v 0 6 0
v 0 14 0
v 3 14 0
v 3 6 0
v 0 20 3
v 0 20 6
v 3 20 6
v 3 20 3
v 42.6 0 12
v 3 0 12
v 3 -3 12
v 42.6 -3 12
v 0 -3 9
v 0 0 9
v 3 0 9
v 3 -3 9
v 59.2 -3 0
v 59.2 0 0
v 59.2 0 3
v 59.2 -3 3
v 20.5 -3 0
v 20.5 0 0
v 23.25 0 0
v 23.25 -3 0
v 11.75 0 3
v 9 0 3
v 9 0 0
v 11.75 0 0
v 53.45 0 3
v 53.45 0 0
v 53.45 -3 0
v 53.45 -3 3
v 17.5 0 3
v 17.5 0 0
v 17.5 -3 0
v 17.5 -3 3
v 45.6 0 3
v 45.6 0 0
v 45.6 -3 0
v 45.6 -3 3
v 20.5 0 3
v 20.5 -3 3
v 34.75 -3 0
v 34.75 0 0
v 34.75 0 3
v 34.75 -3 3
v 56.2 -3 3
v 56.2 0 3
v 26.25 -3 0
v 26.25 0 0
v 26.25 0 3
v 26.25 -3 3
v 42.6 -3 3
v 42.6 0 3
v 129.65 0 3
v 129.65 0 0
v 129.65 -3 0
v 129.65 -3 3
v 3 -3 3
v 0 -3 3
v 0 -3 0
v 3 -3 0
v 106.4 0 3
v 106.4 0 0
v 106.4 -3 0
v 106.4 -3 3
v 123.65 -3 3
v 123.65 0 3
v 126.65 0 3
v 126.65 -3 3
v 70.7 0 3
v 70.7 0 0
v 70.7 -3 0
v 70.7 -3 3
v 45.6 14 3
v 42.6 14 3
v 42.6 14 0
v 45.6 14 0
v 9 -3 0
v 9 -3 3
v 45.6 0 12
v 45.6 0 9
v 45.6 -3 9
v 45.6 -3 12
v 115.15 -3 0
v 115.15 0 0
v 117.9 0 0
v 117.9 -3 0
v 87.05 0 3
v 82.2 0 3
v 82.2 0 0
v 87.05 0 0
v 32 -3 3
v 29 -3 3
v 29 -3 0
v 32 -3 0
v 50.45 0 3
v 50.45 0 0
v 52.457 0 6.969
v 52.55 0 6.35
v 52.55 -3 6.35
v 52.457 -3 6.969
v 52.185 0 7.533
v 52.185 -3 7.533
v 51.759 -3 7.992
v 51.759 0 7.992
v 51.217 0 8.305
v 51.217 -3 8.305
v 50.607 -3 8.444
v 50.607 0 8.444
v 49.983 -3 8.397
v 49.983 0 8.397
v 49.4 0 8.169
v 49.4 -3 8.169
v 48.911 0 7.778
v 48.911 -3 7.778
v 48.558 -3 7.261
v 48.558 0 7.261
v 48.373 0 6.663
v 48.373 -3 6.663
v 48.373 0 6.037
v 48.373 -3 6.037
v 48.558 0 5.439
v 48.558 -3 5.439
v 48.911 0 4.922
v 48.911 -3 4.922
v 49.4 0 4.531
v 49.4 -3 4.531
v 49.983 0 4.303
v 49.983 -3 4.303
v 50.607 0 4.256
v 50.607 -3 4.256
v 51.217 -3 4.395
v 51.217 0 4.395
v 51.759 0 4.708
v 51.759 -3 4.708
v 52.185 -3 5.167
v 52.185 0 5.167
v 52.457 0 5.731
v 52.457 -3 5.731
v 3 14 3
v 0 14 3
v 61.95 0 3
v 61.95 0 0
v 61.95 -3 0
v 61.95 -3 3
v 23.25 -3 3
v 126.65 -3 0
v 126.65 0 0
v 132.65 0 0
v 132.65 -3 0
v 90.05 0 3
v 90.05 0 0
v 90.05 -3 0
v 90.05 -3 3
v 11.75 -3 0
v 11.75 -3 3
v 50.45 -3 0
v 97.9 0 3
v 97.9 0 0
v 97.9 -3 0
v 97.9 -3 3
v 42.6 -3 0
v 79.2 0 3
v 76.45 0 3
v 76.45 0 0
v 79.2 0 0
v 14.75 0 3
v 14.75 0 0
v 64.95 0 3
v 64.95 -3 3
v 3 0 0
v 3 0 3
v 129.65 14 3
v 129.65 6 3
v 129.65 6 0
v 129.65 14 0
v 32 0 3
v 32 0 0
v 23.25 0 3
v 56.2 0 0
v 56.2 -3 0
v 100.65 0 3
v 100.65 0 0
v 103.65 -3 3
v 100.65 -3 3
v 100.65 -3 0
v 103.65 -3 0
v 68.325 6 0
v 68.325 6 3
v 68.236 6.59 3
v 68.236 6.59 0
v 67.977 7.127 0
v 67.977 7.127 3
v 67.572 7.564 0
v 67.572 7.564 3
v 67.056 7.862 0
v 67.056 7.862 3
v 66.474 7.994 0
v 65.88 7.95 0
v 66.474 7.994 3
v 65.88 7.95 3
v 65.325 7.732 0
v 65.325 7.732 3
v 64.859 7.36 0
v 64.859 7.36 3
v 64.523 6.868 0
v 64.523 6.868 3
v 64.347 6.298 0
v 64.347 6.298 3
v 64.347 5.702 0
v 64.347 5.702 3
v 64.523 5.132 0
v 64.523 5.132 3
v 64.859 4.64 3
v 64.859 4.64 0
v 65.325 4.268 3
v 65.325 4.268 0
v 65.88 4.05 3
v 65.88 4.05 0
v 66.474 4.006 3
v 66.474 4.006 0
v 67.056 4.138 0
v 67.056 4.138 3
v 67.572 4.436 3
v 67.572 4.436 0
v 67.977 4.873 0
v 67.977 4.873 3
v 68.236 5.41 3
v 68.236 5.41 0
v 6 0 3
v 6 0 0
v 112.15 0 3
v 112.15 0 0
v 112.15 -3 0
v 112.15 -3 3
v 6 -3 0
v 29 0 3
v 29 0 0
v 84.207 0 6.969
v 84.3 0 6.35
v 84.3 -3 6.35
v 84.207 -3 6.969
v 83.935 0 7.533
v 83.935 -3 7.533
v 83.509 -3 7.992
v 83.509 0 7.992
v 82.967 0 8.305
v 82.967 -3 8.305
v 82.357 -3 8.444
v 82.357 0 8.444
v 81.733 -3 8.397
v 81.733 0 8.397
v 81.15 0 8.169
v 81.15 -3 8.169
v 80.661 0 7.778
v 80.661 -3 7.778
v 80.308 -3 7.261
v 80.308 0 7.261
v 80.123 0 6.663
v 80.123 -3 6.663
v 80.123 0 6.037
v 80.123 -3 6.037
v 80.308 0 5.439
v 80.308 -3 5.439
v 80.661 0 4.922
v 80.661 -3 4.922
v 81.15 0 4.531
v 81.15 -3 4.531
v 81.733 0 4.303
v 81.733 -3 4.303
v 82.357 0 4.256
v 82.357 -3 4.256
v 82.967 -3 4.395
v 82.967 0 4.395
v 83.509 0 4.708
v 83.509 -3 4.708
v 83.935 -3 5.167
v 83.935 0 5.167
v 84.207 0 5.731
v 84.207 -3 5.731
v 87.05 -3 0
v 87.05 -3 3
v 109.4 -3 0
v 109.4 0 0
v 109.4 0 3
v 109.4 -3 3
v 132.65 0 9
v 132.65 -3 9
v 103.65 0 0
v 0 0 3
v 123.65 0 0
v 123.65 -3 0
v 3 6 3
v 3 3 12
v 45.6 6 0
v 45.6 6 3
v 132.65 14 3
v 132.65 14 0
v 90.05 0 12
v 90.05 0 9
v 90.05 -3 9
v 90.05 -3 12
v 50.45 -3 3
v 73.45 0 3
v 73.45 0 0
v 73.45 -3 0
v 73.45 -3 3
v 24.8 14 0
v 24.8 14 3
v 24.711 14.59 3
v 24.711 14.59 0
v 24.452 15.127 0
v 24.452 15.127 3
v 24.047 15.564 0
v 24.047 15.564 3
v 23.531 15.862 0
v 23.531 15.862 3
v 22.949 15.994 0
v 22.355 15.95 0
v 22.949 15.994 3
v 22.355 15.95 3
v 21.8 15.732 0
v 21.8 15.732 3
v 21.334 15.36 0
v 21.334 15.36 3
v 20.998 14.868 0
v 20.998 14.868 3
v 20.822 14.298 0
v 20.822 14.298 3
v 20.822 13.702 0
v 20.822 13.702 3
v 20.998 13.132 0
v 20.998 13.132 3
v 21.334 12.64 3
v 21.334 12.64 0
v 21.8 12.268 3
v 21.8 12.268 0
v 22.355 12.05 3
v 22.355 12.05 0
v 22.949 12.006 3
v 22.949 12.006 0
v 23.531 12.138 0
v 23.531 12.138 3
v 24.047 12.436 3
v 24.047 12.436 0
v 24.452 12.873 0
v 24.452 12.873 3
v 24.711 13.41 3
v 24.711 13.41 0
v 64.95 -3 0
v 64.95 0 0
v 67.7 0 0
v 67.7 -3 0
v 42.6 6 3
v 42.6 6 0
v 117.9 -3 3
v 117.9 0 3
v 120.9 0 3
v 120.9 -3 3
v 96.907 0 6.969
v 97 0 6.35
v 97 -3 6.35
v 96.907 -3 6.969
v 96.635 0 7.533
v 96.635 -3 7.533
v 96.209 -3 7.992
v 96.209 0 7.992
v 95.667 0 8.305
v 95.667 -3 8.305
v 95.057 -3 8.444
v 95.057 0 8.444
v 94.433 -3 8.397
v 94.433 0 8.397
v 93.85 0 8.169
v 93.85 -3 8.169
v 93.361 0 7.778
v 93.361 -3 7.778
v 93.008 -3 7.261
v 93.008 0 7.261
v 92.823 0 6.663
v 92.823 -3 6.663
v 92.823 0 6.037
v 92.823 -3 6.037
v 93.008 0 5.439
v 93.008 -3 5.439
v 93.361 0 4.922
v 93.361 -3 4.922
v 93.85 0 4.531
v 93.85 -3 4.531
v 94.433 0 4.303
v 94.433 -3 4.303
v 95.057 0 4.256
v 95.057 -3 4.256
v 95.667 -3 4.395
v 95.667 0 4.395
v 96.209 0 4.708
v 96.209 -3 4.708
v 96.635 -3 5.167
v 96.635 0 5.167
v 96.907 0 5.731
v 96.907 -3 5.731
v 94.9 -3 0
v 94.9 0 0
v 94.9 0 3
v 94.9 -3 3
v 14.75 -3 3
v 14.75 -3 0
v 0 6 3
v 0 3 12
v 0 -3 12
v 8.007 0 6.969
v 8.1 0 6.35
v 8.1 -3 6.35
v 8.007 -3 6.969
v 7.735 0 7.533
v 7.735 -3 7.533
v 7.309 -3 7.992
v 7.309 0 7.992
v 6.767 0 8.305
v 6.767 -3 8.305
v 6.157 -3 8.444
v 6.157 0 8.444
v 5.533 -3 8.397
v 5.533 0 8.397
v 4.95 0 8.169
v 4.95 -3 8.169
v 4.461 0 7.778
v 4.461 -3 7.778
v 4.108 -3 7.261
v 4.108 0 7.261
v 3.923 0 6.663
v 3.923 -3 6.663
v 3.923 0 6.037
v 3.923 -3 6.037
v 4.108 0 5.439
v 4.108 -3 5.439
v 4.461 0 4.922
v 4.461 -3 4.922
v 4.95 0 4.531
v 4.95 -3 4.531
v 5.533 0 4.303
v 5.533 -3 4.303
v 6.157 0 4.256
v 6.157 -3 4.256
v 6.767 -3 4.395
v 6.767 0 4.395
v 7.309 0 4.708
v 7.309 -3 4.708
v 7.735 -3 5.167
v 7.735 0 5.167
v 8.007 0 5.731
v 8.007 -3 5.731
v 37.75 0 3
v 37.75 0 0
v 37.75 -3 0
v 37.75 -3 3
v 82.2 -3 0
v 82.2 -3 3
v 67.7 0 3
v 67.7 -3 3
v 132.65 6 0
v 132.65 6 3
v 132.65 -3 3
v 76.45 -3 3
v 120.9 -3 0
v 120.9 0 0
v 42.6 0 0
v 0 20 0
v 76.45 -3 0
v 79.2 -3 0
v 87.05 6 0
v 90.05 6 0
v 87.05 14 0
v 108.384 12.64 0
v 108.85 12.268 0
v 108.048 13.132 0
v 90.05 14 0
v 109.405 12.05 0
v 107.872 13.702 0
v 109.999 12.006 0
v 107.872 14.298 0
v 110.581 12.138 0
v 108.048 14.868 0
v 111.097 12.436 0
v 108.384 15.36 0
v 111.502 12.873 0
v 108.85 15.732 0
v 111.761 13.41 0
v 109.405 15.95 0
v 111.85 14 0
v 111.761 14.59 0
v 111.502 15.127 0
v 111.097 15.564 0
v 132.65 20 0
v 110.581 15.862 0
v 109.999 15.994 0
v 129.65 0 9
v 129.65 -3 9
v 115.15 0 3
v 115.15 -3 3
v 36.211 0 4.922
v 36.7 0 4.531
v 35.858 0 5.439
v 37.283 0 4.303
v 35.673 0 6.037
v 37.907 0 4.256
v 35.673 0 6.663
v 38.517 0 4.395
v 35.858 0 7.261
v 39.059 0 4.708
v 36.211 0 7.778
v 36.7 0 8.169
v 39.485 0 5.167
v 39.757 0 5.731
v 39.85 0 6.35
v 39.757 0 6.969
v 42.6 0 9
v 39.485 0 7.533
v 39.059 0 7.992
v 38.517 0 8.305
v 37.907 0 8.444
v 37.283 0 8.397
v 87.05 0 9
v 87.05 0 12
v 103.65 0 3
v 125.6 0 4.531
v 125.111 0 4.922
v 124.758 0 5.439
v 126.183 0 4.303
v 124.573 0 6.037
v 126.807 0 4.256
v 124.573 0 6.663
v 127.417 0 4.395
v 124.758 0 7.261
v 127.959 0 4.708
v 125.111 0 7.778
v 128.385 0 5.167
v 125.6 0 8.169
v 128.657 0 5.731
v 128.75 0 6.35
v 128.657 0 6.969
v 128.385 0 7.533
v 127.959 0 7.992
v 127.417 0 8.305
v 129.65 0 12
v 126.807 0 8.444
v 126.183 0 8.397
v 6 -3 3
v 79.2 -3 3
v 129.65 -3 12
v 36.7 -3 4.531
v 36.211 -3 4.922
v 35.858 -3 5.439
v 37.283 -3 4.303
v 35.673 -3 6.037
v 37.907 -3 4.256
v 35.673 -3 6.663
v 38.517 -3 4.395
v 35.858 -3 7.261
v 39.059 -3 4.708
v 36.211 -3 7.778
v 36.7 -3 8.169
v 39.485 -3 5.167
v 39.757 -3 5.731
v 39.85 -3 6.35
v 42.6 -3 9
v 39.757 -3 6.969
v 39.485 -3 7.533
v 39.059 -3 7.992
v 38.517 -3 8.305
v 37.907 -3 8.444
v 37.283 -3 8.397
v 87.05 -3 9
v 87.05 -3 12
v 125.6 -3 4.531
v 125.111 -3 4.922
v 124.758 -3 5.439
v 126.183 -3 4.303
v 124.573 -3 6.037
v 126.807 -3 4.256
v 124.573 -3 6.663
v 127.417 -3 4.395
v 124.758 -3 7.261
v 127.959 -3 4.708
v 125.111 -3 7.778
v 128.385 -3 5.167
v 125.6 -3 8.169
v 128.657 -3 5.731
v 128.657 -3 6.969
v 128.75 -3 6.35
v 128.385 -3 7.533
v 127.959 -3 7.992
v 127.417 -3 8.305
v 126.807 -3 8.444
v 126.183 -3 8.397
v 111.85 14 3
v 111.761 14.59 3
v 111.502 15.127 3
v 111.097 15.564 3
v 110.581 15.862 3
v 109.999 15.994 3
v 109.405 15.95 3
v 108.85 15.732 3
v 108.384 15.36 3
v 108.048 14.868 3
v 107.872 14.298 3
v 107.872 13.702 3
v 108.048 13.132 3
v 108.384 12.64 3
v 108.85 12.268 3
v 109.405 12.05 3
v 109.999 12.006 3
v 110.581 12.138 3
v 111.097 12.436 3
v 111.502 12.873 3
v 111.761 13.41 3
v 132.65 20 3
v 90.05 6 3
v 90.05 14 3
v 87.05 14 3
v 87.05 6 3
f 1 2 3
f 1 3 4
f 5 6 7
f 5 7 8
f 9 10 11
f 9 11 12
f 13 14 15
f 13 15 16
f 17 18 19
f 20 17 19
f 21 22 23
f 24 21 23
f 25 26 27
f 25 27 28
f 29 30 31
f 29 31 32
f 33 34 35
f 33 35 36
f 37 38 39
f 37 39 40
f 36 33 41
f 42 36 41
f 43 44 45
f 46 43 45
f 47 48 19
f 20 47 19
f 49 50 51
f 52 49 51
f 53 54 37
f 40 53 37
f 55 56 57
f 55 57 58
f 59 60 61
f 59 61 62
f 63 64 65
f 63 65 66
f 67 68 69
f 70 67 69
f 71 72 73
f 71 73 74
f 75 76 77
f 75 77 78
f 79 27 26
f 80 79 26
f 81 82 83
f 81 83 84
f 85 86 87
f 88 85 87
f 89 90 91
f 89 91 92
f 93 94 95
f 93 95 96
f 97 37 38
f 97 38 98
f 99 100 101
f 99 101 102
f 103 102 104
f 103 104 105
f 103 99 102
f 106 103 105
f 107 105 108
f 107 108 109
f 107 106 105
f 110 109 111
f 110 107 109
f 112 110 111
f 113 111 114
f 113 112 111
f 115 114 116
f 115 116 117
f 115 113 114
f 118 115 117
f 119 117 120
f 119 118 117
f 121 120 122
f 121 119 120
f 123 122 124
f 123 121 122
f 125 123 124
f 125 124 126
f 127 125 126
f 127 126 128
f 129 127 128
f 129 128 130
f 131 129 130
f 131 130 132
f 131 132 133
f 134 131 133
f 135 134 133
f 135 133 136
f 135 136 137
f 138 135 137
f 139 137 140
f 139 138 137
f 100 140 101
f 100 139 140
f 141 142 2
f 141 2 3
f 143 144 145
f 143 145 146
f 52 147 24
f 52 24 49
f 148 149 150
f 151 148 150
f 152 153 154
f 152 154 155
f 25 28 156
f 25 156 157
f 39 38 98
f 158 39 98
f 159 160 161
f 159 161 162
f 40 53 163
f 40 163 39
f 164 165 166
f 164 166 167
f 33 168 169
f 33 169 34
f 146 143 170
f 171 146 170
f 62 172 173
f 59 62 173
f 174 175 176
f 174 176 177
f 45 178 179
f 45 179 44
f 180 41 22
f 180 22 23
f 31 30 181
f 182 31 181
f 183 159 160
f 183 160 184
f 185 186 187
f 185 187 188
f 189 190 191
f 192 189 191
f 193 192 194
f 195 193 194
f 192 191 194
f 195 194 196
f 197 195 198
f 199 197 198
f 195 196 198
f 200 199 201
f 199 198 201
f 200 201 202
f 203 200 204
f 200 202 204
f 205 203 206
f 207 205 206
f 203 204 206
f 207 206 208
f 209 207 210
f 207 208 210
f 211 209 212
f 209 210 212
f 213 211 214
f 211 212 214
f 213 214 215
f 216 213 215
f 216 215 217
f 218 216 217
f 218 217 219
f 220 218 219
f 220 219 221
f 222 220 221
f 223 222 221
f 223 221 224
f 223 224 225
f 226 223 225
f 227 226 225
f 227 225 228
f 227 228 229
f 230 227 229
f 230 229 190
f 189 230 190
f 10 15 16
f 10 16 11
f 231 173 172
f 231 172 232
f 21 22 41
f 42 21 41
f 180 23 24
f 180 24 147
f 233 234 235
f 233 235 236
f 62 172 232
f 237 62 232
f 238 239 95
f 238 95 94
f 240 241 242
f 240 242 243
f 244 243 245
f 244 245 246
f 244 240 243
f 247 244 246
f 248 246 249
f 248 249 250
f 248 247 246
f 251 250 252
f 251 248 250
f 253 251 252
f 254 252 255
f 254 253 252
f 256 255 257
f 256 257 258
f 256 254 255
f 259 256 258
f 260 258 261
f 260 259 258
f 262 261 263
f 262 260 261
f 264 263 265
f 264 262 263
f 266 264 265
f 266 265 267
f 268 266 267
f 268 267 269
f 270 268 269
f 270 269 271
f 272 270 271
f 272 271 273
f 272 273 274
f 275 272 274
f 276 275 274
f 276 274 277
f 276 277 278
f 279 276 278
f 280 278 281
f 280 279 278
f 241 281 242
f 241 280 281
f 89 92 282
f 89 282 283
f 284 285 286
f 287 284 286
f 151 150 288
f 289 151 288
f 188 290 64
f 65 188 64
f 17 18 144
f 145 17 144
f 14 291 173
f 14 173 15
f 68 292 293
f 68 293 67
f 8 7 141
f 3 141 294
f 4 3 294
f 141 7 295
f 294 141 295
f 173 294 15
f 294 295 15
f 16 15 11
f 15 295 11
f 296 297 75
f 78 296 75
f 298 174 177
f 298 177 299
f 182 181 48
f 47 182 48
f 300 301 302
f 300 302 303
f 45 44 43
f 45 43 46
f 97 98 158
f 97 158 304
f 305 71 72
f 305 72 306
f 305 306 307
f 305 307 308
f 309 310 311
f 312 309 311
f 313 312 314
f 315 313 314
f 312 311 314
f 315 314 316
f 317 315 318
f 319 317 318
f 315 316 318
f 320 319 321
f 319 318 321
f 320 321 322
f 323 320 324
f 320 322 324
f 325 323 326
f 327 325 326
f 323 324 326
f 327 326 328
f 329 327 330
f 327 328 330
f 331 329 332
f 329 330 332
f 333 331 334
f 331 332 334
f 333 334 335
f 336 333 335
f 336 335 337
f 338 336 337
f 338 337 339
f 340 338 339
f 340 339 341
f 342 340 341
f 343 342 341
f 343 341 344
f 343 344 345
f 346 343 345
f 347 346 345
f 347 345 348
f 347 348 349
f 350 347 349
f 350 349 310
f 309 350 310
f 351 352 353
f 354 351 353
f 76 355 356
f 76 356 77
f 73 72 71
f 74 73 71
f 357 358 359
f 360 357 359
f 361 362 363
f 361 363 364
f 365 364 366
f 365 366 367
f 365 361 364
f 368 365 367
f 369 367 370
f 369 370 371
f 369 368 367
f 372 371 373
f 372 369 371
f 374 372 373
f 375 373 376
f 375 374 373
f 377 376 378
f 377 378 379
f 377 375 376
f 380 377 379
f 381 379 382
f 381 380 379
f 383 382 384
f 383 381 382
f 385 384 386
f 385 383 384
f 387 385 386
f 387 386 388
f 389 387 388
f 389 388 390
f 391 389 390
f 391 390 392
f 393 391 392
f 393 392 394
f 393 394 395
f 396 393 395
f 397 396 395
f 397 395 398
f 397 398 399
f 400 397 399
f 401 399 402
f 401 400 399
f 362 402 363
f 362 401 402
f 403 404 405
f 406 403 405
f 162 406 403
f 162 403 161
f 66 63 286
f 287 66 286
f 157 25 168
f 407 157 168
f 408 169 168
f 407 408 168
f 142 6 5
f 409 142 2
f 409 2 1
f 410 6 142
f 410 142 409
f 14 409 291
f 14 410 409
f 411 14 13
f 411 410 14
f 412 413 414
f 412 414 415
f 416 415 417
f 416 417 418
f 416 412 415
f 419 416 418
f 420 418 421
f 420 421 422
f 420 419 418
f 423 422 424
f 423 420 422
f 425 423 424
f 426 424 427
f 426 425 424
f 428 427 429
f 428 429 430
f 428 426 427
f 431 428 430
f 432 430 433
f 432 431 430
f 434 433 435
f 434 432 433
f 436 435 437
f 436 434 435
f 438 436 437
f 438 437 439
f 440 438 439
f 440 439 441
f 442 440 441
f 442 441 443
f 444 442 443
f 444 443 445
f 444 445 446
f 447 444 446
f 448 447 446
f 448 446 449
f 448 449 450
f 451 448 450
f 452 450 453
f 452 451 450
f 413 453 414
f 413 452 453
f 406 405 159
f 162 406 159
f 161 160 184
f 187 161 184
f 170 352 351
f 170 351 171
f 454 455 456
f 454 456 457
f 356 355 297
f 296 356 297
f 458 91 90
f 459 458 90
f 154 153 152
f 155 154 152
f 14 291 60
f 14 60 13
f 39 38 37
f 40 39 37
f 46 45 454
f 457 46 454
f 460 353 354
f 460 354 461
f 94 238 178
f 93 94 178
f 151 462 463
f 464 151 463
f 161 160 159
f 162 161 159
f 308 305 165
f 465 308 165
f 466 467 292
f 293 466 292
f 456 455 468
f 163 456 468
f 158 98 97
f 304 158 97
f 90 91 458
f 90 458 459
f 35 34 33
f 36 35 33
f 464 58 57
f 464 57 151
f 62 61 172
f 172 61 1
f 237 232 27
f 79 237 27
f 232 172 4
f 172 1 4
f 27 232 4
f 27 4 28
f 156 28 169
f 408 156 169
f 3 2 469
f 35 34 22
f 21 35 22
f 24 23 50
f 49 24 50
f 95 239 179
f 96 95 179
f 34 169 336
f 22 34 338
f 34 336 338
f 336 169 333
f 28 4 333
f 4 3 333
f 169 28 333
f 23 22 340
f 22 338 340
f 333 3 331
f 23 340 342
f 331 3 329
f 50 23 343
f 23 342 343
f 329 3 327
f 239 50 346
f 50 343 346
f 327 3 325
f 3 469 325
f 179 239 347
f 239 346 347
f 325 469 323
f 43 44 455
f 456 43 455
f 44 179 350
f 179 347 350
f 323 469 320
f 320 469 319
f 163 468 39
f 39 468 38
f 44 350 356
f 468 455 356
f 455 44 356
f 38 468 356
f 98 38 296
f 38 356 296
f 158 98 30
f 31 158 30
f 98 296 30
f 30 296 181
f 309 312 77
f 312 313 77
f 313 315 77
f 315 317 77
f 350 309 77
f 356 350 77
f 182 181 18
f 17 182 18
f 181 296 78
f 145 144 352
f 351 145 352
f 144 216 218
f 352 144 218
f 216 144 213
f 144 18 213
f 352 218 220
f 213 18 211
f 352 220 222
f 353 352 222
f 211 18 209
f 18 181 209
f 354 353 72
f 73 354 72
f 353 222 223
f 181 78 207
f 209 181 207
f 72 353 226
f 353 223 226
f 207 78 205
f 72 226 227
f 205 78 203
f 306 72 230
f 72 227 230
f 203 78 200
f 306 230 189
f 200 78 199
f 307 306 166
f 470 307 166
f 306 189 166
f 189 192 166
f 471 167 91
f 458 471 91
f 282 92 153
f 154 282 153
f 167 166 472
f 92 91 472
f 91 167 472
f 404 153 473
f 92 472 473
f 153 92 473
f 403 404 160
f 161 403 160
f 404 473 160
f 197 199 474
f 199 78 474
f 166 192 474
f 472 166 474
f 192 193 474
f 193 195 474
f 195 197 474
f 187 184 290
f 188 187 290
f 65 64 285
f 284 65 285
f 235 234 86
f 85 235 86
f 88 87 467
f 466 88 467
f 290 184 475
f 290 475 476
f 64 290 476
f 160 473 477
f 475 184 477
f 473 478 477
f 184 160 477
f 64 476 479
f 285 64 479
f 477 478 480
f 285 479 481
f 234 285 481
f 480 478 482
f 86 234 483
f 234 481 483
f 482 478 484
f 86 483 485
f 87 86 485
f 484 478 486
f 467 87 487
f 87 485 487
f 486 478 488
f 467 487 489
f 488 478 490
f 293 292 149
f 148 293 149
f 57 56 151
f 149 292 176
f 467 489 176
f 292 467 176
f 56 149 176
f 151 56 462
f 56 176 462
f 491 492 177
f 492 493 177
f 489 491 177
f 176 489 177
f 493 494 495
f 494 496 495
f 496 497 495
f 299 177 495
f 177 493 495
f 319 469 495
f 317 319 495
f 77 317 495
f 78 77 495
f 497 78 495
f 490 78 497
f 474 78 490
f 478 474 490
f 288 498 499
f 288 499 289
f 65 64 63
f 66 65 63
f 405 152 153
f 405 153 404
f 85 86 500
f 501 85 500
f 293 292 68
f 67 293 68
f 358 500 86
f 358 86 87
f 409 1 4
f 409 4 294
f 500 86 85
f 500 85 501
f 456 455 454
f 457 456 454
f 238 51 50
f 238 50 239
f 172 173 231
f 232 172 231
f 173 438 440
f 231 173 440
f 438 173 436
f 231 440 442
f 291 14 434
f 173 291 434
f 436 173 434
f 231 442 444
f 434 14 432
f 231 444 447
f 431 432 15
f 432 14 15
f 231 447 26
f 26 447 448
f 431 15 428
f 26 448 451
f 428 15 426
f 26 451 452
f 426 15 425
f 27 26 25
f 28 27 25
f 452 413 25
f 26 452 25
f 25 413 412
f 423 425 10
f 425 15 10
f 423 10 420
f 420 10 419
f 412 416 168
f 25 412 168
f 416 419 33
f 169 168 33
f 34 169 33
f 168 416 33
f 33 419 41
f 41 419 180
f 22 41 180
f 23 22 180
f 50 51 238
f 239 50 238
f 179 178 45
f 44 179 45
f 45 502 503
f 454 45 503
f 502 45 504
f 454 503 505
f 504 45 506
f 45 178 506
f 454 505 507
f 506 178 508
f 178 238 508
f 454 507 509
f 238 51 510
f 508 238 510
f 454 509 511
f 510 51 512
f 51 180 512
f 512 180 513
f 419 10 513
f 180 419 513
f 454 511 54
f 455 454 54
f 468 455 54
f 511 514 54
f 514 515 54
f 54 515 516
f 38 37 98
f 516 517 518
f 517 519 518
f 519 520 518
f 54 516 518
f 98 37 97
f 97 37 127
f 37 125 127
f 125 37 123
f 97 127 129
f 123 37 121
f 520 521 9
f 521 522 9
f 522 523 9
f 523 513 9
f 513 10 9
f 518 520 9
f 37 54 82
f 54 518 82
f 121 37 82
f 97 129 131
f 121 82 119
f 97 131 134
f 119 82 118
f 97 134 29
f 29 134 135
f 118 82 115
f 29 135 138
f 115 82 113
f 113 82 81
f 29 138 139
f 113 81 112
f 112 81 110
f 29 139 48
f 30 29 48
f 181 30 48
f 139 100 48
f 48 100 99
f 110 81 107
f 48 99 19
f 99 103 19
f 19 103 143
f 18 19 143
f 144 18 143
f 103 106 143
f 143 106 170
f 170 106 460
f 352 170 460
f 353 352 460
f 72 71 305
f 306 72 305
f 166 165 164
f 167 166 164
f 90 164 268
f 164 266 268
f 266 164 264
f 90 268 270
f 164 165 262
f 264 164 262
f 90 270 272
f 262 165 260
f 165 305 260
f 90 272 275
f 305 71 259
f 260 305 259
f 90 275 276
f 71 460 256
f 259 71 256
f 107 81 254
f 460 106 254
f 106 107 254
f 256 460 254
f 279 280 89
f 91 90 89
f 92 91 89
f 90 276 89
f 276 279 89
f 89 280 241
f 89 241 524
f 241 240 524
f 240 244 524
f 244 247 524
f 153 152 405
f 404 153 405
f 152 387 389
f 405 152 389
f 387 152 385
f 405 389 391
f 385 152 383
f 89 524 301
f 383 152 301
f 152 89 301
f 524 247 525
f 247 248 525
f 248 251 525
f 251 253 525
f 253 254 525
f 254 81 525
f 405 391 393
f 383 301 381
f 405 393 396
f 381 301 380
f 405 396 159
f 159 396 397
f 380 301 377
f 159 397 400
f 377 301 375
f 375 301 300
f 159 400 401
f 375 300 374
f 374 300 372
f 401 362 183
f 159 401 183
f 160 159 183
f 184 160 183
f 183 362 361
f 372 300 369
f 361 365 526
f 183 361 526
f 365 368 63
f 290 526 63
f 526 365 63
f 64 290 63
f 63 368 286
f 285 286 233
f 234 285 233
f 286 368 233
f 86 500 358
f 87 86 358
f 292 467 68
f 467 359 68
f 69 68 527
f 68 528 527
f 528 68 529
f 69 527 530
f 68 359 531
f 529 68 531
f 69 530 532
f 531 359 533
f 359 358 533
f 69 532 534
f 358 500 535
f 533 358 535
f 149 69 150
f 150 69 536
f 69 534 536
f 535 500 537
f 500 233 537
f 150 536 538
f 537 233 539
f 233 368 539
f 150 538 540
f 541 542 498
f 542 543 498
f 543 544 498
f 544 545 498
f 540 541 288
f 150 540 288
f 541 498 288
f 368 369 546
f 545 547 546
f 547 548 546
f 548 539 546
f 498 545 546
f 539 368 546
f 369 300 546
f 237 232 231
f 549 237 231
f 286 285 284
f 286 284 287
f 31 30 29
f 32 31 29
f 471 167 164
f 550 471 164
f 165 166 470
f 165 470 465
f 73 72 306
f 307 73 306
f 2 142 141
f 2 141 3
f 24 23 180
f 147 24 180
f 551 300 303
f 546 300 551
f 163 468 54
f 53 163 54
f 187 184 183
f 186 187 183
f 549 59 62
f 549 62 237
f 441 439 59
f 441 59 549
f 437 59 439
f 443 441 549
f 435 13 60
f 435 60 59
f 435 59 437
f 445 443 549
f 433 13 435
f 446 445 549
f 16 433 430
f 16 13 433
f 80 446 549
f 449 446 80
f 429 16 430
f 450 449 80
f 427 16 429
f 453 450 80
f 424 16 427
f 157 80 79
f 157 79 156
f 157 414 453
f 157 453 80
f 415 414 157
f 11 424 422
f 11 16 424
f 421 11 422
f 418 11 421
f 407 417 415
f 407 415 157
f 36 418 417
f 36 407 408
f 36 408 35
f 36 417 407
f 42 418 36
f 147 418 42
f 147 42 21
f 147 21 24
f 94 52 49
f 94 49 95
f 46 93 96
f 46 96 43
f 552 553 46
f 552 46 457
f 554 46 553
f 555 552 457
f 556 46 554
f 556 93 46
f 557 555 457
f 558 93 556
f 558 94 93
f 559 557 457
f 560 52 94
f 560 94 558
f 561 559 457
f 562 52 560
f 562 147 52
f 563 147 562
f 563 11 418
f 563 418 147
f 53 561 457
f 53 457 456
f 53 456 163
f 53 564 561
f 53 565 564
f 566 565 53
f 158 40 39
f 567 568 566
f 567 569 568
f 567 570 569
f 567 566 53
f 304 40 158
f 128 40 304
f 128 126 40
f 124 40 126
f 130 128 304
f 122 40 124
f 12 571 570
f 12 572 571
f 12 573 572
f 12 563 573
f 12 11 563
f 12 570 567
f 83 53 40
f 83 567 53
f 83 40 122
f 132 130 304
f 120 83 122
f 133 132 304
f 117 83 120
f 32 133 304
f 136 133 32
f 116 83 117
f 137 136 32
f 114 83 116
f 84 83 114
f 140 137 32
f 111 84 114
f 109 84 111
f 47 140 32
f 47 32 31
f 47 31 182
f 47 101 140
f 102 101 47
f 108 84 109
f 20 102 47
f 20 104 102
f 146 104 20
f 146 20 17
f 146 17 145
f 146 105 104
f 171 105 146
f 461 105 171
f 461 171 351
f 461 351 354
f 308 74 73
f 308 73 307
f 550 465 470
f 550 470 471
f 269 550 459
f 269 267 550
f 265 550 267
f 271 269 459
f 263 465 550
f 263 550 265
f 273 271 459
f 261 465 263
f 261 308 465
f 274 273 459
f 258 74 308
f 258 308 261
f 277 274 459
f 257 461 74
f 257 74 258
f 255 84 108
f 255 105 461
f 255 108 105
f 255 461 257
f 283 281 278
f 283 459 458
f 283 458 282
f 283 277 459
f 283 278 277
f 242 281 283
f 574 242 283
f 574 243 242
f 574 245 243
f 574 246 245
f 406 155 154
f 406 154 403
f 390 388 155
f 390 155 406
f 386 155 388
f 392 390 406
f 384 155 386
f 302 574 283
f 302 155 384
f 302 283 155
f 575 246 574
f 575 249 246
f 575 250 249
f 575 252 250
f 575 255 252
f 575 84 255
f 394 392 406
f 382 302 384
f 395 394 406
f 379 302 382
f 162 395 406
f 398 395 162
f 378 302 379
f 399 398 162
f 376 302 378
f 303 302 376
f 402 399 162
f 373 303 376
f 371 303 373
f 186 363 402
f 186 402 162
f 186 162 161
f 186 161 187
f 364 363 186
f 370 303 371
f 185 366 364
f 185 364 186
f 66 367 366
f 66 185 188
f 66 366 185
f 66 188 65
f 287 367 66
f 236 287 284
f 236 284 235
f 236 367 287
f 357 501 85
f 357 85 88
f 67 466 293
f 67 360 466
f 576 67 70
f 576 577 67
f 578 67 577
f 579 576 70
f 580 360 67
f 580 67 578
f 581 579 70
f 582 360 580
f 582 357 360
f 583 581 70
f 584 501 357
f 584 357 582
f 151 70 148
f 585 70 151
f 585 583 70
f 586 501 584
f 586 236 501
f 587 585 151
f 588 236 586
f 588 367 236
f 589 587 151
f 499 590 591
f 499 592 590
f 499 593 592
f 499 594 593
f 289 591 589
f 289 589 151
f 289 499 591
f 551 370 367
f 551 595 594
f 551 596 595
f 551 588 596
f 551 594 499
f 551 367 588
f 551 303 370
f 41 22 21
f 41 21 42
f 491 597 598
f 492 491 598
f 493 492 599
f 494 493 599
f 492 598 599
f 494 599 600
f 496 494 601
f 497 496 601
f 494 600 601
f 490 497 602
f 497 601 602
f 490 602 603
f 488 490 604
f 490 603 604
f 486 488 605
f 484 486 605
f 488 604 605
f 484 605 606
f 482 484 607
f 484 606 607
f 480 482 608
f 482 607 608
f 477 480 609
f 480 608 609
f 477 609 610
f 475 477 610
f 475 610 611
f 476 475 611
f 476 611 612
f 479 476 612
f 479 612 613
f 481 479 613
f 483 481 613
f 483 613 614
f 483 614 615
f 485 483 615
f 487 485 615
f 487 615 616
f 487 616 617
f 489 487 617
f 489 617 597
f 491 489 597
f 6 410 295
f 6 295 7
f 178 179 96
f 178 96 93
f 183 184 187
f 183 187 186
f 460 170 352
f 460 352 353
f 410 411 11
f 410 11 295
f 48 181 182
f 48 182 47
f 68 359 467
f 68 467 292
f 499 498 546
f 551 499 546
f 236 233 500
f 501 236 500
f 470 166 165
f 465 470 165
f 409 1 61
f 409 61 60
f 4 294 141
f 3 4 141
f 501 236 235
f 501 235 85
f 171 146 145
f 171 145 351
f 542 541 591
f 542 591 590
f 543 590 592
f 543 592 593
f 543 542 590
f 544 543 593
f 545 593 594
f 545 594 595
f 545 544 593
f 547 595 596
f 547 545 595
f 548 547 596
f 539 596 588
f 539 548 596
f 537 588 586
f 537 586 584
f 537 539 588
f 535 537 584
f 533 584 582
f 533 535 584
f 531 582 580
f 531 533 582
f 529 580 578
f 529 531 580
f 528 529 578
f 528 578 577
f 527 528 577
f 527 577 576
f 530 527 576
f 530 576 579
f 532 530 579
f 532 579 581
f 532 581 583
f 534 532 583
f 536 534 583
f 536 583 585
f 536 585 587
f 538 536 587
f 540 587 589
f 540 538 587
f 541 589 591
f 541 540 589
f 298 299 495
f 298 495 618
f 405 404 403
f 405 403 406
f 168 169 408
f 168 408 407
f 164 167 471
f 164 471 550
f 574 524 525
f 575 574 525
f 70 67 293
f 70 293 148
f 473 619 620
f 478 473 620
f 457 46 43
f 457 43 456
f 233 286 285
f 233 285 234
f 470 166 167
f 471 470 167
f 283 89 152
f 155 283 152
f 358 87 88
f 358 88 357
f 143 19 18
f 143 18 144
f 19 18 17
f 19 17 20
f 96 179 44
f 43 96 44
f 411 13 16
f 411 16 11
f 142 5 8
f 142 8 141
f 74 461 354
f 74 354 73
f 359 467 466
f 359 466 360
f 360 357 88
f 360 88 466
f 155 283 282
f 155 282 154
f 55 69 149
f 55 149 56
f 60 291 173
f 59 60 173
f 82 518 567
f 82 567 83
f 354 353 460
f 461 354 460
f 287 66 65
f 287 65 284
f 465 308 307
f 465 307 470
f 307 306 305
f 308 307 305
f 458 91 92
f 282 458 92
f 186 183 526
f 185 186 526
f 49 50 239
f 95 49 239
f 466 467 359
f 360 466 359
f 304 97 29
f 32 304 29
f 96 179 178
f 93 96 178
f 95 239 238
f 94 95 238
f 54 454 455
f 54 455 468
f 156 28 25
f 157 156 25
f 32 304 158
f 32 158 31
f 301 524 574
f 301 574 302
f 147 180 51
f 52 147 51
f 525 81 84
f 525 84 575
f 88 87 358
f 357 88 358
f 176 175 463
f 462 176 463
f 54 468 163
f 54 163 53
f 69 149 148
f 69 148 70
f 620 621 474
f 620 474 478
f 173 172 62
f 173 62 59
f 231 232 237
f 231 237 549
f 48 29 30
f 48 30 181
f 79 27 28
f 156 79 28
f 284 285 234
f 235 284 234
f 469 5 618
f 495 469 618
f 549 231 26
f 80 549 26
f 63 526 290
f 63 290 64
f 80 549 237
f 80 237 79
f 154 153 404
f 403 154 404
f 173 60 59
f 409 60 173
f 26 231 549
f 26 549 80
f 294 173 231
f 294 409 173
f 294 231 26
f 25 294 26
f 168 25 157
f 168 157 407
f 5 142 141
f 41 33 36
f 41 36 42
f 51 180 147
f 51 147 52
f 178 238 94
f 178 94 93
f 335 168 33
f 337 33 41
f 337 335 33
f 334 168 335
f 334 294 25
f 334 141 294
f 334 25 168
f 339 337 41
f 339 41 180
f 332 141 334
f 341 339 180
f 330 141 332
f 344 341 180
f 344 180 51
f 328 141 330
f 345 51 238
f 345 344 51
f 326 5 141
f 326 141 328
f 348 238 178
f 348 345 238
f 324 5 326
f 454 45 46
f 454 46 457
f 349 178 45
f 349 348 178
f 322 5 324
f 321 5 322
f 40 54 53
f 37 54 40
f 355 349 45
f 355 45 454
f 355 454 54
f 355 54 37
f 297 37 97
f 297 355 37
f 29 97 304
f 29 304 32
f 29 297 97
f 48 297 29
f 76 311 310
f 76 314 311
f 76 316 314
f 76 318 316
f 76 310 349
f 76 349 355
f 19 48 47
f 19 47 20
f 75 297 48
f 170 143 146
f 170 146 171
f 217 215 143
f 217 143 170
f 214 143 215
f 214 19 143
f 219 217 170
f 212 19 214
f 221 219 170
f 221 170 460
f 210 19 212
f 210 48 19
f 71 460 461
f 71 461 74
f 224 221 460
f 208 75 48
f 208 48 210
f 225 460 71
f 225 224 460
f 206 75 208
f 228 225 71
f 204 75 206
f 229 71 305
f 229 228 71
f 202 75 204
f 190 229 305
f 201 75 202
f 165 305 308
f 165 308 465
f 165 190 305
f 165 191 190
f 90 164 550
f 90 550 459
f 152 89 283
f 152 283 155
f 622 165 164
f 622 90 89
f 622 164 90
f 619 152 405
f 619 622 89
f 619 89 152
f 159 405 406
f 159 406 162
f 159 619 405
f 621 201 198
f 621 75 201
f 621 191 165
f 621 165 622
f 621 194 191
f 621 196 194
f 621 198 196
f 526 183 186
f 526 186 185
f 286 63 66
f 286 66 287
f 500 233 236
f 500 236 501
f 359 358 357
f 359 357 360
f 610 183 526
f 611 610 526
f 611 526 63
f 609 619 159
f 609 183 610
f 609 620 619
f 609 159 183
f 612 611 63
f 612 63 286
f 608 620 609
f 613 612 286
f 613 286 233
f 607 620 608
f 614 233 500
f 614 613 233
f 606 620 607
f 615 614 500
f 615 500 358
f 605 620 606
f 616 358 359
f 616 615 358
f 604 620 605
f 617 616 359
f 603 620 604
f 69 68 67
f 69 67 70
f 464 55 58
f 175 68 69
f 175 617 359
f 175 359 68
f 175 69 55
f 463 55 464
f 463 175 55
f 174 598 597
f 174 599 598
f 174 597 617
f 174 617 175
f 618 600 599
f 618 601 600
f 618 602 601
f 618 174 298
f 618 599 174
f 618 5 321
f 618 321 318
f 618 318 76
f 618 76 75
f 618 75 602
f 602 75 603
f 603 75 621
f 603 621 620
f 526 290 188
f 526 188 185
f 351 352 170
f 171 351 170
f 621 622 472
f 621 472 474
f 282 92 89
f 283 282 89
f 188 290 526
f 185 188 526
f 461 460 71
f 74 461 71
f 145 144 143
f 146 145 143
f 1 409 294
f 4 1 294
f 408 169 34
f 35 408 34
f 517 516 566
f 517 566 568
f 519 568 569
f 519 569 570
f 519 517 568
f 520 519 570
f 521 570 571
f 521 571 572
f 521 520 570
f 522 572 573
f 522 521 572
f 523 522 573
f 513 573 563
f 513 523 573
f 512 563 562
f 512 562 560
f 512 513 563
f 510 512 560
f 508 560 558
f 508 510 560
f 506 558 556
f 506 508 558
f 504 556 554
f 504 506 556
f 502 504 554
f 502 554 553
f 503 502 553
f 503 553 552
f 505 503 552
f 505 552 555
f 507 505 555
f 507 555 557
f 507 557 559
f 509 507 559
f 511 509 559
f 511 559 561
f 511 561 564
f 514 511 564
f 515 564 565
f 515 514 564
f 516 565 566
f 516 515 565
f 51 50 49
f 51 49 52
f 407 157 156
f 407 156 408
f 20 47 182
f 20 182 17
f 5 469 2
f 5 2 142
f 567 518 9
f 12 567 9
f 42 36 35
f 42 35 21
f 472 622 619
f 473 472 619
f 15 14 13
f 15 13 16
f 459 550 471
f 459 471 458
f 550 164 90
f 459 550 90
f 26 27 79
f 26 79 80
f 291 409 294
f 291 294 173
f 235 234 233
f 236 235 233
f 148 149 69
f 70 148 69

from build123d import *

# Parameters (mm, degrees)
F0_W      = 132.65
F0_H      = 12
F0_R      = 2.1
F3_DEPTH  = 3
F1_W      = 3
F1_H      = 3
F4_DEPTH  = 3.001
F2_W      = 132.65
F2_H      = 3
F5_DEPTH  = 20
F6_DEPTH  = 3
F7_W      = 3
F7_H      = 8
F8_DEPTH  = 3.001
F9_W      = 3
F9_H      = 3
F10_DEPTH = 3.001
F11_R     = 2
F13_DEPTH = 3.001
F14_DEPTH = 3


# Not quite as in the source:
# - a feature names something its author has since deleted; it is built from what else it names


with BuildPart() as f3:
    # F0 (on Front) → F3 (new body)
    with BuildSketch(Plane.XZ):
        with Locations((66.325, 6)):
            Rectangle(F0_W, F0_H)
        with Locations((6, 6.35)):
            Circle(F0_R, mode=Mode.SUBTRACT)
        with Locations((37.75, 6.35)):
            Circle(F0_R, mode=Mode.SUBTRACT)
        with Locations((50.45, 6.35)):
            Circle(F0_R, mode=Mode.SUBTRACT)
        with Locations((82.2, 6.35)):
            Circle(F0_R, mode=Mode.SUBTRACT)
        with Locations((94.9, 6.35)):
            Circle(F0_R, mode=Mode.SUBTRACT)
        with Locations((126.65, 6.35)):
            Circle(F0_R, mode=Mode.SUBTRACT)
    extrude(amount=F3_DEPTH)

    # F1 (on face) → F4 (cut, through all)
    with BuildSketch(Plane.XZ):
        with Locations((1.5, 1.5)):
            Rectangle(F1_W, F1_H)
        with Locations((7.5, 1.5)):
            Rectangle(F1_W, F1_H)
        with Locations((13.25, 1.5)):
            Rectangle(F1_W, F1_H)
        with Locations((19, 1.5)):
            Rectangle(F1_W, F1_H)
        with Locations((24.75, 1.5)):
            Rectangle(F1_W, F1_H)
        with Locations((30.5, 1.5)):
            Rectangle(F1_W, F1_H)
        with Locations((36.25, 1.5)):
            Rectangle(F1_W, F1_H)
        with Locations((44.1, 1.5)):
            Rectangle(F1_W, F1_H)
        with Locations((51.95, 1.5)):
            Rectangle(F1_W, F1_H)
        with Locations((57.7, 1.5)):
            Rectangle(F1_W, F1_H)
        with Locations((63.45, 1.5)):
            Rectangle(F1_W, F1_H)
        with Locations((69.2, 1.5)):
            Rectangle(F1_W, F1_H)
        with Locations((74.95, 1.5)):
            Rectangle(F1_W, F1_H)
        with Locations((80.7, 1.5)):
            Rectangle(F1_W, F1_H)
        with Locations((88.55, 1.5)):
            Rectangle(F1_W, F1_H)
        with Locations((96.4, 1.5)):
            Rectangle(F1_W, F1_H)
        with Locations((102.15, 1.5)):
            Rectangle(F1_W, F1_H)
        with Locations((107.9, 1.5)):
            Rectangle(F1_W, F1_H)
        with Locations((113.65, 1.5)):
            Rectangle(F1_W, F1_H)
        with Locations((119.4, 1.5)):
            Rectangle(F1_W, F1_H)
        with Locations((125.15, 1.5)):
            Rectangle(F1_W, F1_H)
    extrude(amount=F4_DEPTH, mode=Mode.SUBTRACT)

    # F9 (on face) → F10 (cut, through all)
    with BuildSketch(Plane.XZ):
        with Locations((88.55, 10.5)):
            Rectangle(F9_W, F9_H)
        with Locations((131.15, 10.5)):
            Rectangle(F9_W, F9_H)
        with Locations((44.1, 10.5)):
            Rectangle(F9_W, F9_H)
        with Locations((1.5, 10.5)):
            Rectangle(F9_W, F9_H)
    extrude(amount=F10_DEPTH, mode=Mode.SUBTRACT)


with BuildPart() as f5:
    # F2 (on Front) → F5 (new body)
    with BuildSketch(Plane.XZ):
        with Locations((66.325, 1.5)):
            Rectangle(F2_W, F2_H)
    extrude(amount=-F5_DEPTH)

    # F1 (on face) → F6 (join)
    with BuildSketch(Plane.XZ):
        with Locations((125.15, 1.5)):
            Rectangle(F1_W, F1_H)
        with Locations((119.4, 1.5)):
            Rectangle(F1_W, F1_H)
        with Locations((113.65, 1.5)):
            Rectangle(F1_W, F1_H)
        with Locations((107.9, 1.5)):
            Rectangle(F1_W, F1_H)
        with Locations((102.15, 1.5)):
            Rectangle(F1_W, F1_H)
        with Locations((96.4, 1.5)):
            Rectangle(F1_W, F1_H)
        with Locations((88.55, 1.5)):
            Rectangle(F1_W, F1_H)
        with Locations((80.7, 1.5)):
            Rectangle(F1_W, F1_H)
        with Locations((74.95, 1.5)):
            Rectangle(F1_W, F1_H)
        with Locations((69.2, 1.5)):
            Rectangle(F1_W, F1_H)
        with Locations((63.45, 1.5)):
            Rectangle(F1_W, F1_H)
        with Locations((57.7, 1.5)):
            Rectangle(F1_W, F1_H)
        with Locations((51.95, 1.5)):
            Rectangle(F1_W, F1_H)
        with Locations((44.1, 1.5)):
            Rectangle(F1_W, F1_H)
        with Locations((36.25, 1.5)):
            Rectangle(F1_W, F1_H)
        with Locations((30.5, 1.5)):
            Rectangle(F1_W, F1_H)
        with Locations((24.75, 1.5)):
            Rectangle(F1_W, F1_H)
        with Locations((19, 1.5)):
            Rectangle(F1_W, F1_H)
        with Locations((13.25, 1.5)):
            Rectangle(F1_W, F1_H)
        with Locations((7.5, 1.5)):
            Rectangle(F1_W, F1_H)
        with Locations((1.5, 1.5)):
            Rectangle(F1_W, F1_H)
        with Locations((131.15, 1.5)):
            Rectangle(F1_W, F1_H)
    extrude(amount=F6_DEPTH)

    # F7 (on face) → F8 (cut, through all)
    with BuildSketch(Plane.XY.offset(3)):
        with Locations((131.15, 10)):
            Rectangle(F7_W, F7_H)
        with Locations((44.1, 10)):
            Rectangle(F7_W, F7_H)
        with Locations((1.5, 10)):
            Rectangle(F7_W, F7_H)
        with Locations((88.55, 10)):
            Rectangle(F7_W, F7_H)
    extrude(amount=-F8_DEPTH, mode=Mode.SUBTRACT)

    # F11 (on face) → F13 (cut, through all)
    with BuildSketch(Plane.XY.offset(3)):
        with Locations((66.325, 6)):
            Circle(F11_R)
        with Locations((109.85, 14)):
            Circle(F11_R)
        with Locations((22.8, 14)):
            Circle(F11_R)
    extrude(amount=-F13_DEPTH, mode=Mode.SUBTRACT)


with BuildPart() as f14:
    # F12 (on face) → F14 (new body)
    with BuildSketch(Plane(origin=(0, 0, 0), x_dir=(0, -1, 0), z_dir=(-1, 0, 0))):
        Polygon((-20, 6), (-20, 3), (-14, 3), (-14, 0), (-6, 0), (-6, 3), (0, 3), (0, 9), (3, 9), (3, 12), (-3, 12), align=None)
    extrude(amount=-F14_DEPTH)


solid = Compound([f3.part, f5.part, f14.part])
